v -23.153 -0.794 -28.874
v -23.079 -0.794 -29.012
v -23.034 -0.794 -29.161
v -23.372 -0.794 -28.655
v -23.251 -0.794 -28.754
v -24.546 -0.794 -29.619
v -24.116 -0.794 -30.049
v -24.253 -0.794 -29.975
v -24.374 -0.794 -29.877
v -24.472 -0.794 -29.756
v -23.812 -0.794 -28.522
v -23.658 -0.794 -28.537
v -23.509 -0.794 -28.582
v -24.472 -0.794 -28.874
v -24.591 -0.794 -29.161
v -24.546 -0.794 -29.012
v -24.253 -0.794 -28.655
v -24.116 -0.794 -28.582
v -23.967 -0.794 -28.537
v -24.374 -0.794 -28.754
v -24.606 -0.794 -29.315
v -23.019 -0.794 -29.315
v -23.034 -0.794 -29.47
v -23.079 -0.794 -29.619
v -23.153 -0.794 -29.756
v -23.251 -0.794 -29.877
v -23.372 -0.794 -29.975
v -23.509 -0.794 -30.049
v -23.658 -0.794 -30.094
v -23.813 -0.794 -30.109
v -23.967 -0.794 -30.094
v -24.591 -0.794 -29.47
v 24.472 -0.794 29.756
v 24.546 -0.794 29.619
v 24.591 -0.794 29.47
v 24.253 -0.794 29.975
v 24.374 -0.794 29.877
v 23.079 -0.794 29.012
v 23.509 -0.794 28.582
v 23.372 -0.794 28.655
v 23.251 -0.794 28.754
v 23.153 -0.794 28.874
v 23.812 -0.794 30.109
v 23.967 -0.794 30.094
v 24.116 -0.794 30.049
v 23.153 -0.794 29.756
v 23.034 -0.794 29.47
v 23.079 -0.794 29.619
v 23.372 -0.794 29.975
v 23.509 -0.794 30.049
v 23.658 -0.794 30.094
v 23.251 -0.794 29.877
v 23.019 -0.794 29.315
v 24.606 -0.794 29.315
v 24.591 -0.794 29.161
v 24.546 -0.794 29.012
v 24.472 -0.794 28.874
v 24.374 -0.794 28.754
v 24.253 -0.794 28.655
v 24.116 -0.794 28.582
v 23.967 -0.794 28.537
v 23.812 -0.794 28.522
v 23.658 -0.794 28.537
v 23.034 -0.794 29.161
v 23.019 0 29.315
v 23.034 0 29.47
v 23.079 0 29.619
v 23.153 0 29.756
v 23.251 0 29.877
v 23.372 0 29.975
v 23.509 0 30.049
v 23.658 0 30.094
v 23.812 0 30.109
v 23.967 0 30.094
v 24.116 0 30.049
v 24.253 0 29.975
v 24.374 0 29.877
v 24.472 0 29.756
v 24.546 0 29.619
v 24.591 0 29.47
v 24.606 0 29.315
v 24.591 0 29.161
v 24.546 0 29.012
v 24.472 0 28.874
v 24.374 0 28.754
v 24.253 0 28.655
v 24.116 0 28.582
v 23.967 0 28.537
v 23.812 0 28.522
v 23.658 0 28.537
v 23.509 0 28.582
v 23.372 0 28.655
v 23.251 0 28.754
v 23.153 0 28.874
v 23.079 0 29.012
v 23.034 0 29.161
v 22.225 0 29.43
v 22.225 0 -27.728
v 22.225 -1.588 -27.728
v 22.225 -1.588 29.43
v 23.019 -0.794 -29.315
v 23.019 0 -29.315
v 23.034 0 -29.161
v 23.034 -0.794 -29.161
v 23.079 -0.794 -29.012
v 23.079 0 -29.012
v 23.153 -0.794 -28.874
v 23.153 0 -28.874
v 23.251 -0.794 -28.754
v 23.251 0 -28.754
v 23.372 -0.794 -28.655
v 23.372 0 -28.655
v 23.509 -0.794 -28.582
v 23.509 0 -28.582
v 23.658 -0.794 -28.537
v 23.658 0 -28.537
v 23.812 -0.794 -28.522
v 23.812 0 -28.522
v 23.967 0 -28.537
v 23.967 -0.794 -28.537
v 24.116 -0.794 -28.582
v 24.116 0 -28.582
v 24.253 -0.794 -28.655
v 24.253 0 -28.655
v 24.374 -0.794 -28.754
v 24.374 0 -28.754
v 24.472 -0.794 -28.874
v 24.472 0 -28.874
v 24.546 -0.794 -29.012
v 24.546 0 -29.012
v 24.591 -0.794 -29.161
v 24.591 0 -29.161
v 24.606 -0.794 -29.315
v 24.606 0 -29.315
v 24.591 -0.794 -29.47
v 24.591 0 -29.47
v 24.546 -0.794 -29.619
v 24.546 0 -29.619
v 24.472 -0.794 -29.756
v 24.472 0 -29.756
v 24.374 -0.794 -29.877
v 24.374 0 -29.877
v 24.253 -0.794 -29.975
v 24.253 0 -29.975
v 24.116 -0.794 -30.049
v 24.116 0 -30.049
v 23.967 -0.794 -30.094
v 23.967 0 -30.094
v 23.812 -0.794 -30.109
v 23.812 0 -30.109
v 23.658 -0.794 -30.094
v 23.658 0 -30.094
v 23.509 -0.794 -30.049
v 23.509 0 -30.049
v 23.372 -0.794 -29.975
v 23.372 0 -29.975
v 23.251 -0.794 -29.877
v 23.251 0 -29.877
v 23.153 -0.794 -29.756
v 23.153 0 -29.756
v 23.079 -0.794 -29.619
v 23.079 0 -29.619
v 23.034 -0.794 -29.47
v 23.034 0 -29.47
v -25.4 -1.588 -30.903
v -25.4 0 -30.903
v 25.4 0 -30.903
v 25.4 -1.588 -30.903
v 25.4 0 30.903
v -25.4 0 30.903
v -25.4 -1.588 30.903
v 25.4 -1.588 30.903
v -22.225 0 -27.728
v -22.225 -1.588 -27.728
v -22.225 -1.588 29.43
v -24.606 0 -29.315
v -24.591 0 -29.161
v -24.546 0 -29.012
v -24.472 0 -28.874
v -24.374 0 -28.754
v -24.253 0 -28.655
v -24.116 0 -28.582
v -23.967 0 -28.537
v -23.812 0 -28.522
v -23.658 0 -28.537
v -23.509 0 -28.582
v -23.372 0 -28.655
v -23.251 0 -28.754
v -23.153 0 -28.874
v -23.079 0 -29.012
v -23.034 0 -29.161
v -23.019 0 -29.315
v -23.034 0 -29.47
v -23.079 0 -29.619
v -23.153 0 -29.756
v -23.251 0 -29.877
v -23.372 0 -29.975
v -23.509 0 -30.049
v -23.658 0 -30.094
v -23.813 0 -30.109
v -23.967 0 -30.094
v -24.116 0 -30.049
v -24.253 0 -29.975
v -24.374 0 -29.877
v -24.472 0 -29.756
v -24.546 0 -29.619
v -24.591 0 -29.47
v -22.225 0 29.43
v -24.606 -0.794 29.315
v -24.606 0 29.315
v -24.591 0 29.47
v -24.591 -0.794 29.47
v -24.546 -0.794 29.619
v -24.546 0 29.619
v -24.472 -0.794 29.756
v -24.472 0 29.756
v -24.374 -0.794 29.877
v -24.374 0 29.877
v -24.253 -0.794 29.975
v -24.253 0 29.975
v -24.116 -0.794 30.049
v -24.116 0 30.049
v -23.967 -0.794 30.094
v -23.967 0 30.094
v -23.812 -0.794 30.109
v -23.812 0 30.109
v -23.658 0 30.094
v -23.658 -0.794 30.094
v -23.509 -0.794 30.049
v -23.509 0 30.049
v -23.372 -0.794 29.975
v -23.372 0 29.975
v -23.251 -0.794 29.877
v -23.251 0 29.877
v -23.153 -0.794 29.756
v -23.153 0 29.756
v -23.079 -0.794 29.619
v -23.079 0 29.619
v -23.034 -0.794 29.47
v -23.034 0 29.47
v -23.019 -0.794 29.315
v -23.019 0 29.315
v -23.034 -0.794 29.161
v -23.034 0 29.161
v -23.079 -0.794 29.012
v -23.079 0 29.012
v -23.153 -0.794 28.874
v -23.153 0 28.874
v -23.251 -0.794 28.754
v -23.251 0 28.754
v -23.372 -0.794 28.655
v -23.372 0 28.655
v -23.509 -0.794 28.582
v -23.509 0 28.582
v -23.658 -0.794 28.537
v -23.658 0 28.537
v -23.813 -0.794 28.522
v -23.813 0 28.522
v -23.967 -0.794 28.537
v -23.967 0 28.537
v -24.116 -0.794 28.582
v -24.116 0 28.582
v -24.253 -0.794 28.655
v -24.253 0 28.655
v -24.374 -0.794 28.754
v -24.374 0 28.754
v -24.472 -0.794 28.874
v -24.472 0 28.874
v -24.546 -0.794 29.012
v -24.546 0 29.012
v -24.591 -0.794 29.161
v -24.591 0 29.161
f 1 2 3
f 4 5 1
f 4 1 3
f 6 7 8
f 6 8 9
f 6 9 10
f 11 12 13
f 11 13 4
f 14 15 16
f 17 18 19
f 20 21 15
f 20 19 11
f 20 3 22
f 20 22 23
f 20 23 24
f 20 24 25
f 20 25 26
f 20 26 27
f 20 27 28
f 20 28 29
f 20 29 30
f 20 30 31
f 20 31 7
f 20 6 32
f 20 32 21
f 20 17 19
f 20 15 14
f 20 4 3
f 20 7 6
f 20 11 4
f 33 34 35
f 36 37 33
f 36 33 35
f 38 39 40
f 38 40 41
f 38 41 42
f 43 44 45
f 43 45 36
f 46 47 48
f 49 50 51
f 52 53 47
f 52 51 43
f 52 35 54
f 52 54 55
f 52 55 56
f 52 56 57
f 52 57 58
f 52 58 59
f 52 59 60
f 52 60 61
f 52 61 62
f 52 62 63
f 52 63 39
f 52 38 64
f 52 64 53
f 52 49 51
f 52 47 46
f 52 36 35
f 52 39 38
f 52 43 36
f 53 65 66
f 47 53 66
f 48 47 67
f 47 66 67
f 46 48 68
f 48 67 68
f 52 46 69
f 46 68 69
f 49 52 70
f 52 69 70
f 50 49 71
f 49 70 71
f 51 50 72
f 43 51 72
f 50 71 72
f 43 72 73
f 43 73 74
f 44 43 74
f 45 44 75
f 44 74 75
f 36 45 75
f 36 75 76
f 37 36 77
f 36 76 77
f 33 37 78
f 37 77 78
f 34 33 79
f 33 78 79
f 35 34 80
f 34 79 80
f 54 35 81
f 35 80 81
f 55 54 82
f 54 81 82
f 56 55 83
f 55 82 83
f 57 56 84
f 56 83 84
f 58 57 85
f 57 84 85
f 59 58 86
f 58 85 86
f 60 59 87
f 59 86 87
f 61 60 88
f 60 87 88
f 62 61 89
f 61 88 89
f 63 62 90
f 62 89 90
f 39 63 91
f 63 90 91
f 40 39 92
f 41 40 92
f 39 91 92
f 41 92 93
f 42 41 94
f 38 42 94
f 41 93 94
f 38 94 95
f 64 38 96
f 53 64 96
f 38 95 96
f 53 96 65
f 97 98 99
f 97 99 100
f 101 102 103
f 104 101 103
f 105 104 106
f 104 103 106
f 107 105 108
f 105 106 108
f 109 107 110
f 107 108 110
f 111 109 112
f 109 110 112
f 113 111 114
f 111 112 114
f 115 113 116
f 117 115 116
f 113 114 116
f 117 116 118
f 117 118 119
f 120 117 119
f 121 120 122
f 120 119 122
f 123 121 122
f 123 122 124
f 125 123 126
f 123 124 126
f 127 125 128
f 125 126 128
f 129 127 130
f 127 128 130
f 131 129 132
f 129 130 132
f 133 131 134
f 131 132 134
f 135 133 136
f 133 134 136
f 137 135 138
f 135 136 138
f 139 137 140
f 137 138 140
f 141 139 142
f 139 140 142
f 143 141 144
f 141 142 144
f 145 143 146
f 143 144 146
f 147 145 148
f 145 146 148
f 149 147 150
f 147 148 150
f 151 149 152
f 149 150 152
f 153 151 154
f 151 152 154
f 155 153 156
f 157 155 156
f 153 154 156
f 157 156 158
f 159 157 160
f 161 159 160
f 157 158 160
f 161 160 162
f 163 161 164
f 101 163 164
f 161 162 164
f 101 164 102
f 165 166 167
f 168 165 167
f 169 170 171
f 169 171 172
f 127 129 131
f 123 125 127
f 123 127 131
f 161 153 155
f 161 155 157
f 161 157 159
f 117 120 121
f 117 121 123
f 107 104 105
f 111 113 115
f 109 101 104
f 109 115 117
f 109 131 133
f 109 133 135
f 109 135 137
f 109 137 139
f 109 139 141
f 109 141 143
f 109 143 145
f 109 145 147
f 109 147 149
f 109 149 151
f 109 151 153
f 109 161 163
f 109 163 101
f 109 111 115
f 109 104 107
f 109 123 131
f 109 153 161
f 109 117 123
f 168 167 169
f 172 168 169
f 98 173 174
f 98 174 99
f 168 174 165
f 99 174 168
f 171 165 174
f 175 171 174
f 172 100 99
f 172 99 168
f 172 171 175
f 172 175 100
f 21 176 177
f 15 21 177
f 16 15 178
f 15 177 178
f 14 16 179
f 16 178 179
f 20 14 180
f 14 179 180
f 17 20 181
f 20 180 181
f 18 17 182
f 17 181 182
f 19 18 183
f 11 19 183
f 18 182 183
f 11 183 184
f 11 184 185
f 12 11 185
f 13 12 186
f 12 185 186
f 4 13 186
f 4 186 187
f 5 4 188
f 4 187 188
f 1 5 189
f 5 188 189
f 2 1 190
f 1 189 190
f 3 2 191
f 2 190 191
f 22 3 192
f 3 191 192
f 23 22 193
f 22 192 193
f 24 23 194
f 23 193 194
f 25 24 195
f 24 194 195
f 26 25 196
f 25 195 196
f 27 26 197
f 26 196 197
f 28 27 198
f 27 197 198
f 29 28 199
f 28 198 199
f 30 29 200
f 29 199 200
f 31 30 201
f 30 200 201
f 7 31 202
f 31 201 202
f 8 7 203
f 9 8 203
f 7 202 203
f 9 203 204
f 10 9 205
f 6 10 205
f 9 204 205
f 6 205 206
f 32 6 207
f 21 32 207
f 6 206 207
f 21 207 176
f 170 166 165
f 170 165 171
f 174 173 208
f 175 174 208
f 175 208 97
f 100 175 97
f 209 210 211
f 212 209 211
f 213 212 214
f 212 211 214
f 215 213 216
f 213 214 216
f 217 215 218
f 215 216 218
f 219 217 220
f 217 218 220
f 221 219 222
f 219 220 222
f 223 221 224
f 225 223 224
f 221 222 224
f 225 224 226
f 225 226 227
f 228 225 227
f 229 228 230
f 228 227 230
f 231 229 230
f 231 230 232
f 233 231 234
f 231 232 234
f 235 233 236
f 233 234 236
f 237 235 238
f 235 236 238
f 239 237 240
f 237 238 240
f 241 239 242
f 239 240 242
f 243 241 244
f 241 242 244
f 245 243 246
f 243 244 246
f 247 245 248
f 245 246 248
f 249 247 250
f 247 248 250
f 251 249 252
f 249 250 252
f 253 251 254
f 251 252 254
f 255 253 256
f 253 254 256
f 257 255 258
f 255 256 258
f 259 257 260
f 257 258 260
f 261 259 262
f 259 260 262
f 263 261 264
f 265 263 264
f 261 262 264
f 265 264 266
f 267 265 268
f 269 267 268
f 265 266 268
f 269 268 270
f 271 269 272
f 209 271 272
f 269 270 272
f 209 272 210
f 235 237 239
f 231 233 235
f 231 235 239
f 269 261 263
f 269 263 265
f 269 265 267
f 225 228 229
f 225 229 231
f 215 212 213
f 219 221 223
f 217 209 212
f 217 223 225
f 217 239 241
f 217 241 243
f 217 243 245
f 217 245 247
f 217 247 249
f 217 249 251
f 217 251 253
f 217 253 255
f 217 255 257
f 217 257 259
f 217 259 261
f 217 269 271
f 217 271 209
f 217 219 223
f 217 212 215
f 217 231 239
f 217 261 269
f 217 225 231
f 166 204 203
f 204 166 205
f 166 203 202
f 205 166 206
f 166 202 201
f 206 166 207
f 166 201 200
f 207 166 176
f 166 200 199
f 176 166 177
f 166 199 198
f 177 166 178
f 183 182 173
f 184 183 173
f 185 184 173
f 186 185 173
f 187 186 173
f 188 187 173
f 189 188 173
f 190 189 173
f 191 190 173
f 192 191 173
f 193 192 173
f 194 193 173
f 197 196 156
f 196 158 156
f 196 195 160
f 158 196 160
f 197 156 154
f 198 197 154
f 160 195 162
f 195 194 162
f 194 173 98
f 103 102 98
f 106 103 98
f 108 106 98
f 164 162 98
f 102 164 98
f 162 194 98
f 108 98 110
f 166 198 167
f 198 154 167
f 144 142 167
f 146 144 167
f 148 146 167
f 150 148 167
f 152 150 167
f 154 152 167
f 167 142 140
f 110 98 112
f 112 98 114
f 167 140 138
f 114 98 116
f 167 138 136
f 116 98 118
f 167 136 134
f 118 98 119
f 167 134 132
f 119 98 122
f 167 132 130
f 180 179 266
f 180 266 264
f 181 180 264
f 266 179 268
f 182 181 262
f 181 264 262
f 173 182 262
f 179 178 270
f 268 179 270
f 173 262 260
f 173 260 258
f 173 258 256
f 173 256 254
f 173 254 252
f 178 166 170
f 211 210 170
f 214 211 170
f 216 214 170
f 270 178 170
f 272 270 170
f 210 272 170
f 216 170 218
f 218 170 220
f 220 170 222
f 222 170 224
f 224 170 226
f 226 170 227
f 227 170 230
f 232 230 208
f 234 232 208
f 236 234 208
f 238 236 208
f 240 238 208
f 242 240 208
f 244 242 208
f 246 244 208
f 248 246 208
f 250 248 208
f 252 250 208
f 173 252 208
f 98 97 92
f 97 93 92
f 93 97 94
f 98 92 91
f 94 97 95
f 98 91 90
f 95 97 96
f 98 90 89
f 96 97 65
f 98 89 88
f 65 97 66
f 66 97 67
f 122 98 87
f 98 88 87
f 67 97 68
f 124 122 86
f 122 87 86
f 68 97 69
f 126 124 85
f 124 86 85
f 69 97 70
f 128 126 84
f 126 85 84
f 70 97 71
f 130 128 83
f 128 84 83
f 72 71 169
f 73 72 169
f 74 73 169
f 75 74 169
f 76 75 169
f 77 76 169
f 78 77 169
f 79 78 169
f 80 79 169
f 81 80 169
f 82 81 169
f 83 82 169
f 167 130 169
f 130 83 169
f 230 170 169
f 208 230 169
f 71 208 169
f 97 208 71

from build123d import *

# Parameters (mm, degrees)
F0_W     = 50.8
F0_H     = 61.80582
F0_W_2   = 44.45
F0_H_2   = 57.15762
F1_DEPTH = 1.5875
F2_R     = 0.79375
F3_DEPTH = 0.79375


with BuildPart() as f1:
    # F0 (on Front) → F1 (new body)
    with BuildSketch(Plane.XZ):
        Rectangle(F0_W, F0_H)
        with Locations((0, 0.8509)):
            Rectangle(F0_W_2, F0_H_2, mode=Mode.SUBTRACT)
    extrude(amount=F1_DEPTH)

    # F2 (on face) → F3 (cut)
    with BuildSketch(Plane(origin=(0, 0, 0), x_dir=(-1, 0, 0), z_dir=(0, 1, 0))):
        with Locations((-23.8125, 29.31541)):
            Circle(F2_R)
        with Locations((-23.8125, -29.31541)):
            Circle(F2_R)
        with Locations((23.8125, -29.31541)):
            Circle(F2_R)
        with Locations((23.8125, 29.31541)):
            Circle(F2_R)
    extrude(amount=-F3_DEPTH, mode=Mode.SUBTRACT)


solid = f1.part
